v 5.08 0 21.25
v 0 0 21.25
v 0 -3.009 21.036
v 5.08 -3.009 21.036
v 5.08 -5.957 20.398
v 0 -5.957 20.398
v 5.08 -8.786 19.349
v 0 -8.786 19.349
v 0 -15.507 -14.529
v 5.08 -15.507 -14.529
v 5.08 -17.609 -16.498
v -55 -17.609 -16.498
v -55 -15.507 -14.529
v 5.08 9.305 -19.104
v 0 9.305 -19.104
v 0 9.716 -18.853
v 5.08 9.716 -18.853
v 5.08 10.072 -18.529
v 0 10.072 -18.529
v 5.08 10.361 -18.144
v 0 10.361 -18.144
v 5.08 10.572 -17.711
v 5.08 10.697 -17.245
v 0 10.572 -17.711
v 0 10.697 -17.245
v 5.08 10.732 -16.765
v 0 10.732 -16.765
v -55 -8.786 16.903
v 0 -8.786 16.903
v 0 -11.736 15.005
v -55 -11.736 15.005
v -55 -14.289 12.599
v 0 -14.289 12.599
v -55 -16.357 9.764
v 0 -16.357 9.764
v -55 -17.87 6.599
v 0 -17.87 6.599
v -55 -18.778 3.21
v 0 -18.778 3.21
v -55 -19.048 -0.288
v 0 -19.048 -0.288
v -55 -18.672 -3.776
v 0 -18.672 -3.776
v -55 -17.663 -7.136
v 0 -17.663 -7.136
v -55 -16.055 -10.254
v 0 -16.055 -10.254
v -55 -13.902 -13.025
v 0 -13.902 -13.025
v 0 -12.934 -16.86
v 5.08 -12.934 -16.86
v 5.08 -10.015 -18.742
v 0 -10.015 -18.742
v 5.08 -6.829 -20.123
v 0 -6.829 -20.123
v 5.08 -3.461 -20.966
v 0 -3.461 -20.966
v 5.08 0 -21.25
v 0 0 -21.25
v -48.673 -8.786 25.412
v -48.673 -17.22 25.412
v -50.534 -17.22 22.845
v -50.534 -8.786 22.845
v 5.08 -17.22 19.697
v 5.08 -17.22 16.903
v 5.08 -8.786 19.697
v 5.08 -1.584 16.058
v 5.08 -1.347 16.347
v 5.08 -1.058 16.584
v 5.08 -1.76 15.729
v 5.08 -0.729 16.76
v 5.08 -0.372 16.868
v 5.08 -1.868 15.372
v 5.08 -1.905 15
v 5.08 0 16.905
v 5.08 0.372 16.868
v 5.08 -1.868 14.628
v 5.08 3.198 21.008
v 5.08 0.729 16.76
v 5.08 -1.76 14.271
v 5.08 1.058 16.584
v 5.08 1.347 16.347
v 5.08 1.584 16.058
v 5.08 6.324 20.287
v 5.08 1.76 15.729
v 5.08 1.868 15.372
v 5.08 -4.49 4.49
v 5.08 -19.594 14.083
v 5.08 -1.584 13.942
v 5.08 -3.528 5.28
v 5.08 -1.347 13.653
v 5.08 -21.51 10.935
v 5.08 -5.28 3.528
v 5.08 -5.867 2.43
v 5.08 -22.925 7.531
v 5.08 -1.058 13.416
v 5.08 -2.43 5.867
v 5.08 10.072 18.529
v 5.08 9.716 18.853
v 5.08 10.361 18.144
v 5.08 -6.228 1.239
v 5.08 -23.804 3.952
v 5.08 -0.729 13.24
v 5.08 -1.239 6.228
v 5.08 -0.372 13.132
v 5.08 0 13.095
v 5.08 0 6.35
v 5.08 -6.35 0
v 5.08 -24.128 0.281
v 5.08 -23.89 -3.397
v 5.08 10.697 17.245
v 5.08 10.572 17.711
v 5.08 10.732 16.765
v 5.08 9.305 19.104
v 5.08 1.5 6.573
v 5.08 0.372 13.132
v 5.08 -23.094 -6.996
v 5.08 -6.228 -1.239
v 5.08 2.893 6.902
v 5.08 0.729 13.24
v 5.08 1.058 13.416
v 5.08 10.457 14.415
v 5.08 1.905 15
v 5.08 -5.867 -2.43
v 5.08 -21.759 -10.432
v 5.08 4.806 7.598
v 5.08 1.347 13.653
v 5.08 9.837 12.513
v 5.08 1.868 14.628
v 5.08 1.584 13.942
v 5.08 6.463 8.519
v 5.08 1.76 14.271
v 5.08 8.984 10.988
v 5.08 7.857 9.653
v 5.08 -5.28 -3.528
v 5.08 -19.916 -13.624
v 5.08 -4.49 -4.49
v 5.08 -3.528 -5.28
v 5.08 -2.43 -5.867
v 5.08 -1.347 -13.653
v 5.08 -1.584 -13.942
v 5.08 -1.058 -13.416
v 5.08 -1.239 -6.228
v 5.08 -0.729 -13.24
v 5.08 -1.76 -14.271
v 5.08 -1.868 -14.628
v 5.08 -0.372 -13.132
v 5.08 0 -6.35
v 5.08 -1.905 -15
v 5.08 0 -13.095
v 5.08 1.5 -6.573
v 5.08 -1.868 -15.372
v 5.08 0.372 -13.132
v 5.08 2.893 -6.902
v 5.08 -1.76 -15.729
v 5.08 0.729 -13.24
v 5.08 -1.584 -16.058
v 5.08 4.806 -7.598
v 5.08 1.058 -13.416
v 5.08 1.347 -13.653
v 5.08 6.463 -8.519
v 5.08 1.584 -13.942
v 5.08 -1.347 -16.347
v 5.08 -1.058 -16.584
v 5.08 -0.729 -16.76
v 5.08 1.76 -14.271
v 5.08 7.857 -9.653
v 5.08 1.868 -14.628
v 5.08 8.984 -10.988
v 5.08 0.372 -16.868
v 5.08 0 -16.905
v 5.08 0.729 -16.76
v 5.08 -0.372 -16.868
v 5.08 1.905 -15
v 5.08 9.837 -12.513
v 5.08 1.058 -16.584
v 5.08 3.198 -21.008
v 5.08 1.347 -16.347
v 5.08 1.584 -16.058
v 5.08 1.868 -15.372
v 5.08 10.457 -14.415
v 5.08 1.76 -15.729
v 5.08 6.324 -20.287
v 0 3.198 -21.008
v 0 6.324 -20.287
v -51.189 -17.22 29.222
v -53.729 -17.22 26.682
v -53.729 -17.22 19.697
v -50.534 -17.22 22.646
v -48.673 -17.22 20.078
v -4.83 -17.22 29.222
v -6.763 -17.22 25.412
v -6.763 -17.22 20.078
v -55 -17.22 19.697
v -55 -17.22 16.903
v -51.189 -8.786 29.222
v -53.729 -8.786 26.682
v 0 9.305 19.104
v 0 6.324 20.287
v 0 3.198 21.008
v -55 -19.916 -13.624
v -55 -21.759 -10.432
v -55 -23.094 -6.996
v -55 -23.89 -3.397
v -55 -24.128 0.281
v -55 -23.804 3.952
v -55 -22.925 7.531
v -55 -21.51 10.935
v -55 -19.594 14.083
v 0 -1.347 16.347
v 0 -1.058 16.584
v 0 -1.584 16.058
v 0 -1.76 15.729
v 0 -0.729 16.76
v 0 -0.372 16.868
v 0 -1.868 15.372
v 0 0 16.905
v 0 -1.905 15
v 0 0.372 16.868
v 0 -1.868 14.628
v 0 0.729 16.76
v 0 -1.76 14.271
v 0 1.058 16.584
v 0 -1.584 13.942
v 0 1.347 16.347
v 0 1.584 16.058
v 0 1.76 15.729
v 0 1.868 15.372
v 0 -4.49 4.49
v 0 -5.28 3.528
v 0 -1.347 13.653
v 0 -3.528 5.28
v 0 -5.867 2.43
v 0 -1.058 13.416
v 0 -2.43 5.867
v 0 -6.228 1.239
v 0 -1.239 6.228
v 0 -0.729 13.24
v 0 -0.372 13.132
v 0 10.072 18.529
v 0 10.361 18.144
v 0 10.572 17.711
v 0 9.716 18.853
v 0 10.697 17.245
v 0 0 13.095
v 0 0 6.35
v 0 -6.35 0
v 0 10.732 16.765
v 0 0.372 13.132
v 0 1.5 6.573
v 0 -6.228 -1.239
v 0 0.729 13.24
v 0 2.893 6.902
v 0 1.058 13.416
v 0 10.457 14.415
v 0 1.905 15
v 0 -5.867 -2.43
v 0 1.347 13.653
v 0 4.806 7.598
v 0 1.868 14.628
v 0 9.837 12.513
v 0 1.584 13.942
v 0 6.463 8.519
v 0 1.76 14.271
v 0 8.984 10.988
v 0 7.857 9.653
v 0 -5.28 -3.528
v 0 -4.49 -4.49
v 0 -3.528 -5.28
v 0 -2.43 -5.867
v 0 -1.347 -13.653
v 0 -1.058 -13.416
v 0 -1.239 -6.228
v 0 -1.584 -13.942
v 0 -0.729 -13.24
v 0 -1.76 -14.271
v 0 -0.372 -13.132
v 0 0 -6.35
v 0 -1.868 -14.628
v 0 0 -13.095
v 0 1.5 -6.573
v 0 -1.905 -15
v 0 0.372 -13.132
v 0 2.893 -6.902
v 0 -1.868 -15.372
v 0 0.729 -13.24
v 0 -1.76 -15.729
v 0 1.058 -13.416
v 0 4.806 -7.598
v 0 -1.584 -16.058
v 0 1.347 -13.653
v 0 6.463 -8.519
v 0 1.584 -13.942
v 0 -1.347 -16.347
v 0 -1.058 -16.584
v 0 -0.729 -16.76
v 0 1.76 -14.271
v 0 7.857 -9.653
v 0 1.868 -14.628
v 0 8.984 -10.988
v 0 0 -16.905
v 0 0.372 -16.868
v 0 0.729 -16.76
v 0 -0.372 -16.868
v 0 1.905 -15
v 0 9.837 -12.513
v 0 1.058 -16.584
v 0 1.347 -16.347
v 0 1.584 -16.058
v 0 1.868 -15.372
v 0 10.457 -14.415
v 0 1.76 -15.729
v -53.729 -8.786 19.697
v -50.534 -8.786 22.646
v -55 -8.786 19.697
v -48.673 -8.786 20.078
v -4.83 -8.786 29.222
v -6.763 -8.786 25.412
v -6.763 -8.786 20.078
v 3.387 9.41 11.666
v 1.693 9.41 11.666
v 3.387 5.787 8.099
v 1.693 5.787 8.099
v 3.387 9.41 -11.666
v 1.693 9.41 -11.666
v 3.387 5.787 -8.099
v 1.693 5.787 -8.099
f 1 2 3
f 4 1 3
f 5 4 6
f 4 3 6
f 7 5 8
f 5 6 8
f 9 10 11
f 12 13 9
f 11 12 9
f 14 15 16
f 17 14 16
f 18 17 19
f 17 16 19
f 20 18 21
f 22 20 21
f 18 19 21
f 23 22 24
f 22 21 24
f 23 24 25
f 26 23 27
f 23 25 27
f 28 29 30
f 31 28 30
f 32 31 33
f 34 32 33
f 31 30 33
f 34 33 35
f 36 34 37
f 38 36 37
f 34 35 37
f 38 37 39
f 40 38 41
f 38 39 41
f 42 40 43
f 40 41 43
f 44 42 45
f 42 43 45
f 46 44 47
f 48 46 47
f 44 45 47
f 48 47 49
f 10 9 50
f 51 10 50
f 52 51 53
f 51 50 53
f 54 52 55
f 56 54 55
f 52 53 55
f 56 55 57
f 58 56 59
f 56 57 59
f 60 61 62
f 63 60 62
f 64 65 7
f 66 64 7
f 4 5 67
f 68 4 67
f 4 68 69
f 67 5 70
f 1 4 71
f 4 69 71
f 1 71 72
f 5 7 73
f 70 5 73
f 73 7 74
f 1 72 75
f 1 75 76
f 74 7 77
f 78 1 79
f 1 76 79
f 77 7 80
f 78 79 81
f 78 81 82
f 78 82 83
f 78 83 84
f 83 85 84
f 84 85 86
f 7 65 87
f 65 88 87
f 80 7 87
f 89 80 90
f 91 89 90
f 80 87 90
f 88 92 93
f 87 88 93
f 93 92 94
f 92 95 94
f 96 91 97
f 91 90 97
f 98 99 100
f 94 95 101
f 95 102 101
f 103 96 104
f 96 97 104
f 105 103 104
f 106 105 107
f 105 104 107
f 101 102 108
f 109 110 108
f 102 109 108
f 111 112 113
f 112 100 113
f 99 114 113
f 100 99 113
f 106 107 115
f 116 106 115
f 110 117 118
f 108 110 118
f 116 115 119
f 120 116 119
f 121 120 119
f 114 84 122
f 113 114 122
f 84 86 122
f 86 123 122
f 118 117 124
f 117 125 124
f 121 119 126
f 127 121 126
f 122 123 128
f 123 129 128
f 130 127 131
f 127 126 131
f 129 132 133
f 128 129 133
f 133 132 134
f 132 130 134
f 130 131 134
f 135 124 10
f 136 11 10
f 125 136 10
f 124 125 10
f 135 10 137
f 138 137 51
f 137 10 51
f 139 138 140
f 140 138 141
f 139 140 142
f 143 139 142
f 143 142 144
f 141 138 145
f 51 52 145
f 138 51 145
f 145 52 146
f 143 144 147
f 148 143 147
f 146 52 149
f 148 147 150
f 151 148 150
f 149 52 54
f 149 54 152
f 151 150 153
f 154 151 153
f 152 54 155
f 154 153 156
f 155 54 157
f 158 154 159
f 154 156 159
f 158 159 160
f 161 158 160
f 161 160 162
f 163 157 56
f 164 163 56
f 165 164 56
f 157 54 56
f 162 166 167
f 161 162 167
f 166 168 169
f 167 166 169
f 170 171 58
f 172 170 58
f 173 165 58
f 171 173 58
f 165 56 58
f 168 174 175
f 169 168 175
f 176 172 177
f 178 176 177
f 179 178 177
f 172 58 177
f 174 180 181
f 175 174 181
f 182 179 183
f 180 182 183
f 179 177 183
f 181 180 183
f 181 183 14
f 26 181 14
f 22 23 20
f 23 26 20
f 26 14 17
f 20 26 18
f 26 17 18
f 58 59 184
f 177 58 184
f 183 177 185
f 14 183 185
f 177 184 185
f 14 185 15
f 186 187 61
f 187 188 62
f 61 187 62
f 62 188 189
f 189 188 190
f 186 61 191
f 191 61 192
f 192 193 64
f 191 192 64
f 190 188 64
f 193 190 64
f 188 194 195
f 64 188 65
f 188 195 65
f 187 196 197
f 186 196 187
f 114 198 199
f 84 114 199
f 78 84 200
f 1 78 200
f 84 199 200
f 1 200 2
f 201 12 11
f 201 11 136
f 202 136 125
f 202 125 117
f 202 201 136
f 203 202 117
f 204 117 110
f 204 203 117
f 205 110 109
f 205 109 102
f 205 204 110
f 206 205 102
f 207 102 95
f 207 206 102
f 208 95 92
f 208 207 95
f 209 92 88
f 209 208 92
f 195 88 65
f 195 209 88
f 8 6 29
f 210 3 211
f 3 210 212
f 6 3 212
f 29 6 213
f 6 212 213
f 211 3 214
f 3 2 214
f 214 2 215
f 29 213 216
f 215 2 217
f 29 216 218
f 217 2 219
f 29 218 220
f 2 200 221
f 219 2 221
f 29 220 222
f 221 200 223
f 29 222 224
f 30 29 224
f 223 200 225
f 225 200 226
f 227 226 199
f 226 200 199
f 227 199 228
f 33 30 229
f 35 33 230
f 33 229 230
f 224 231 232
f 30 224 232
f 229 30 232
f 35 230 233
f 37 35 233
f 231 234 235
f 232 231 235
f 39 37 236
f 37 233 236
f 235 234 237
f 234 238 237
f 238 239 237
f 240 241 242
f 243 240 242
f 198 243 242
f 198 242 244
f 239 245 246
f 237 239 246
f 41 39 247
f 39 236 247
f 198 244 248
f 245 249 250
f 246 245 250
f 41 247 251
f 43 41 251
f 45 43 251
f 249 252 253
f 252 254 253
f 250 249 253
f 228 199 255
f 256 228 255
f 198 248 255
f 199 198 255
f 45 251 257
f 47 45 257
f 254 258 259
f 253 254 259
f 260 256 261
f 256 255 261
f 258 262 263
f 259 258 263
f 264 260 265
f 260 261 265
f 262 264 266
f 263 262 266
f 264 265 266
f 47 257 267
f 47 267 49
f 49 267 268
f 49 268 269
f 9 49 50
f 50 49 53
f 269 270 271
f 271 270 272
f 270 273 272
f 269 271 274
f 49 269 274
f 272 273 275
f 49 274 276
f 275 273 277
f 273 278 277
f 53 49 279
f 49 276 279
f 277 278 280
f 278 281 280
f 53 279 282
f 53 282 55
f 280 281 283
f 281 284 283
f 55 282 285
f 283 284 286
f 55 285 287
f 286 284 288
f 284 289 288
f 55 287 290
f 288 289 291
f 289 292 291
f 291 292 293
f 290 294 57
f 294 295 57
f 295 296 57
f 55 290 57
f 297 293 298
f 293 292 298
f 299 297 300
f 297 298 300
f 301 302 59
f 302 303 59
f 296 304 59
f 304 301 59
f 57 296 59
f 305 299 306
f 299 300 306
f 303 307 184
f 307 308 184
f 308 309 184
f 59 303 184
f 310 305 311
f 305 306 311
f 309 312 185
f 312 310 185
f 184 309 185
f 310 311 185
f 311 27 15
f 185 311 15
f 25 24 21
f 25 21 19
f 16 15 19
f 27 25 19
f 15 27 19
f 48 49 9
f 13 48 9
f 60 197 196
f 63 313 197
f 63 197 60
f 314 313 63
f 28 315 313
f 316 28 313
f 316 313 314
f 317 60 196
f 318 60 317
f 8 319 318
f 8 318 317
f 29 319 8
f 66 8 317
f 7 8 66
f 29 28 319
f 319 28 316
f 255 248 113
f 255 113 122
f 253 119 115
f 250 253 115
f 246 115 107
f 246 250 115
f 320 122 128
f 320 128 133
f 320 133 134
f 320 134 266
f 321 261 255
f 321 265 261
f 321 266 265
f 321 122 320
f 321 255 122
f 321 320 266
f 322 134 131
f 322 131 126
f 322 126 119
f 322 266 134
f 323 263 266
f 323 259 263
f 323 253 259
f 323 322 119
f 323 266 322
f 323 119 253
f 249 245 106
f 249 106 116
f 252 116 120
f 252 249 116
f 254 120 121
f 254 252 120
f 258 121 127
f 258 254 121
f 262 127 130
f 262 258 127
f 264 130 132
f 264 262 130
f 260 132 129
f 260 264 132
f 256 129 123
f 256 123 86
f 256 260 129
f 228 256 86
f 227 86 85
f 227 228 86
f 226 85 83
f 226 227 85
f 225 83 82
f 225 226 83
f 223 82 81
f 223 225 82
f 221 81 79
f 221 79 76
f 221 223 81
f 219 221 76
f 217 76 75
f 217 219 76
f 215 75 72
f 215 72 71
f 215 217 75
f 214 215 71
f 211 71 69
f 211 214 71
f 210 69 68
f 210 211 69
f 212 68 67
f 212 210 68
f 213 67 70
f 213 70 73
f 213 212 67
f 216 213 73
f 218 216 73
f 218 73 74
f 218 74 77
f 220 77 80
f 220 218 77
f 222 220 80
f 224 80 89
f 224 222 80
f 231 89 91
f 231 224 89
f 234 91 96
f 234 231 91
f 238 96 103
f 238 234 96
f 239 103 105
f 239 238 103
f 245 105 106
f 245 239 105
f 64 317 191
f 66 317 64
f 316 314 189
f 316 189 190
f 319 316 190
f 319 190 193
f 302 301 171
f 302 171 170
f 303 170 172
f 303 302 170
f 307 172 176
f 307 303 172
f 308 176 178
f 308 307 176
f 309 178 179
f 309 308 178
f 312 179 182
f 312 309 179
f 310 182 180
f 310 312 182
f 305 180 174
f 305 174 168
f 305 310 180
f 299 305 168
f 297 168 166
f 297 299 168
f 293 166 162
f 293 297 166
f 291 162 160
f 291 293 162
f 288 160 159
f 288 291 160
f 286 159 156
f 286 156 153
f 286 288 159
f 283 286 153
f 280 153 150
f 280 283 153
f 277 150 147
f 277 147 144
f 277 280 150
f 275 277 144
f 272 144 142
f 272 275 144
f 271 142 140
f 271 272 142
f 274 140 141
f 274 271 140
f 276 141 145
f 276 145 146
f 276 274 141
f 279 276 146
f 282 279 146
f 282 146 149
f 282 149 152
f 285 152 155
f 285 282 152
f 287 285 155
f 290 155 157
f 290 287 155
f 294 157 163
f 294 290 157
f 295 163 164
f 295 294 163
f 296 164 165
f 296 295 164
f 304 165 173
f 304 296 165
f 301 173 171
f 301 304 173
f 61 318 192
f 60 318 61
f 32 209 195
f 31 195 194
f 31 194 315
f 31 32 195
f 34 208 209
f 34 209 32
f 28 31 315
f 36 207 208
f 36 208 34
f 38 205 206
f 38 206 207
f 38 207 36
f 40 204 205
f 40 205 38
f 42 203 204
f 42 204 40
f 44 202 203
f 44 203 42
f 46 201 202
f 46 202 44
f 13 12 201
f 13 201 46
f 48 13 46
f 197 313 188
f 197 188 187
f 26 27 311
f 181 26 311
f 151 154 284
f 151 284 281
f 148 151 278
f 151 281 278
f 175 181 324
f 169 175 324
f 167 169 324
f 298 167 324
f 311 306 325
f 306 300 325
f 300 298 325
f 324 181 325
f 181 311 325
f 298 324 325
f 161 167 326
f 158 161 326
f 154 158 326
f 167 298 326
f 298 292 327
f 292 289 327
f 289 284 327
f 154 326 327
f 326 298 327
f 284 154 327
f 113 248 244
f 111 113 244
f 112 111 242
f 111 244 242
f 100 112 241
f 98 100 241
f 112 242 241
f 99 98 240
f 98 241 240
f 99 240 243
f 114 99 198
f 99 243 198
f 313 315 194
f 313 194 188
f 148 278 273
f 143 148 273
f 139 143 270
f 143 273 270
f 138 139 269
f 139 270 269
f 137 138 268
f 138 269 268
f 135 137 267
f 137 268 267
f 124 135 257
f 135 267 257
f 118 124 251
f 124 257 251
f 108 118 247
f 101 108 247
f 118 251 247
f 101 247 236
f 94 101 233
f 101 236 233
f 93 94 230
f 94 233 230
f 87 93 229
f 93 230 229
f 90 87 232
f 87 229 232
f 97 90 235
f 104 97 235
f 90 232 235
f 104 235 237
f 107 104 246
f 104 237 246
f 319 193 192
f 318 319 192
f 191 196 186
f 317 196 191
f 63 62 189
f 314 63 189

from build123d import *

# Parameters (mm, degrees)
SKETCH2_R                = 1.905
BOSS_EXTRUDE1_DEPTH      = 5.08
BOSS_EXTRUDE2_DEPTH      = 55
BOSS_EXTRUDE2_DEPTH_BACK = 5.08
SKETCH6_W                = 60.08
SKETCH6_H                = 8.434755733
BOSS_EXTRUDE3_DEPTH      = 2.794
BOSS_EXTRUDE4_DEPTH      = 8.434756
CHAMFER1_SIZE            = 2.54


with BuildPart() as part:
    # Sketch2 → Boss-Extrude1 (new body)
    with BuildSketch(Plane(origin=(0, 0, 0), x_dir=(0, 0, -1), z_dir=(1, 0, 0))):
        with BuildLine():
            ThreePointArc((6.35, 0), (0, -6.35), (-6.35, 0))
            add(Edge.make_bspline(
                [(-16.765082275, 10.732202813), (-10.995197474, 10.605430611), (-7.093707097, 6.823689801), (-6.35, 0)],
                knots=[0.082134521, 0.082134521, 0.082134521, 0.082134521, 1, 1, 1, 1], degree=3))
            ThreePointArc((-16.765082275, 10.732202813), (-18.143717665, 10.361153764), (-19.104415619, 9.30504185))
            ThreePointArc((-19.104415619, 9.30504185), (-20.706657527, 4.774603025), (-21.25, 0))
            ThreePointArc((-21.25, 0), (0, -21.25), (21.25, 0))
            ThreePointArc((21.25, 0), (20.706657527, 4.774603025), (19.104415619, 9.30504185))
            ThreePointArc((19.104415619, 9.30504185), (18.143717665, 10.361153764), (16.765082275, 10.732202813))
            add(Edge.make_bspline(
                [(16.765082275, 10.732202813), (10.995197474, 10.605430611), (7.093707097, 6.823689801), (6.35, 0)],
                knots=[0.082134521, 0.082134521, 0.082134521, 0.082134521, 1, 1, 1, 1], degree=3))
        make_face()
        with Locations((-15, 0)):
            Circle(SKETCH2_R, mode=Mode.SUBTRACT)
        with Locations((15, 0)):
            Circle(SKETCH2_R, mode=Mode.SUBTRACT)
    extrude(amount=BOSS_EXTRUDE1_DEPTH)

    # Sketch3 → Boss-Extrude2 (add, two sides)
    with BuildSketch(Plane.ZY) as boss_extrude2_sk:
        with BuildLine():
            ThreePointArc((16.903112003, -12.878171633), (1.771236823, -21.176052987), (-14.528859308, -15.507248215))
            Line((-14.528859308, -15.507248215), (-16.497947063, -17.608936444))
            ThreePointArc((-16.497947063, -17.608936444), (0.280682132, -24.128367486), (16.903112003, -17.220386309))
            Line((16.903112003, -17.220386309), (16.903112003, -12.878171633))
        make_face()
        with BuildLine():
            ThreePointArc((16.903112003, -8.785630576), (3.210032128, -18.777598189), (-13.02469505, -13.90179193))
            Line((-13.02469505, -13.90179193), (-14.528859308, -15.507248215))
            ThreePointArc((-14.528859308, -15.507248215), (1.771236823, -21.176052987), (16.903112003, -12.878171633))
            Line((16.903112003, -12.878171633), (16.903112003, -8.785630576))
        make_face()
    extrude(amount=BOSS_EXTRUDE2_DEPTH)
    extrude(boss_extrude2_sk.sketch, amount=-BOSS_EXTRUDE2_DEPTH_BACK)

    # Sketch6 → Boss-Extrude3 (add)
    with BuildSketch(Plane.XY.offset(16.903112003)):
        with Locations((-24.96, -13.003008443)):
            Rectangle(SKETCH6_W, SKETCH6_H)
    extrude(amount=BOSS_EXTRUDE3_DEPTH)

    # Sketch7 → Boss-Extrude4 (add)
    with BuildSketch(Plane(origin=(0, -8.785630576, 0), x_dir=(1, 0, 0), z_dir=(0, 1, 0))):
        Polygon((-53.728777932, -19.697112003), (-53.728777932, -29.222112003), (-4.829590455, -29.222112003), (5.08, -19.697112003), align=None)
        Polygon((-50.534168456, -22.645679195), (-48.67304704, -20.078112003), (-6.76304704, -20.078112003), (-6.76304704, -25.412112003), (-48.67304704, -25.412112003), (-50.534168456, -22.84454481), align=None, mode=Mode.SUBTRACT)
    extrude(amount=-BOSS_EXTRUDE4_DEPTH)

    # Chamfer1
    chamfer1_edges = [part.edges().sort_by_distance(p)[0] for p in [
        (-53.728777932, -13.003008576, 29.222112003),
    ]]
    chamfer(chamfer1_edges, length=CHAMFER1_SIZE)


solid = part.part
